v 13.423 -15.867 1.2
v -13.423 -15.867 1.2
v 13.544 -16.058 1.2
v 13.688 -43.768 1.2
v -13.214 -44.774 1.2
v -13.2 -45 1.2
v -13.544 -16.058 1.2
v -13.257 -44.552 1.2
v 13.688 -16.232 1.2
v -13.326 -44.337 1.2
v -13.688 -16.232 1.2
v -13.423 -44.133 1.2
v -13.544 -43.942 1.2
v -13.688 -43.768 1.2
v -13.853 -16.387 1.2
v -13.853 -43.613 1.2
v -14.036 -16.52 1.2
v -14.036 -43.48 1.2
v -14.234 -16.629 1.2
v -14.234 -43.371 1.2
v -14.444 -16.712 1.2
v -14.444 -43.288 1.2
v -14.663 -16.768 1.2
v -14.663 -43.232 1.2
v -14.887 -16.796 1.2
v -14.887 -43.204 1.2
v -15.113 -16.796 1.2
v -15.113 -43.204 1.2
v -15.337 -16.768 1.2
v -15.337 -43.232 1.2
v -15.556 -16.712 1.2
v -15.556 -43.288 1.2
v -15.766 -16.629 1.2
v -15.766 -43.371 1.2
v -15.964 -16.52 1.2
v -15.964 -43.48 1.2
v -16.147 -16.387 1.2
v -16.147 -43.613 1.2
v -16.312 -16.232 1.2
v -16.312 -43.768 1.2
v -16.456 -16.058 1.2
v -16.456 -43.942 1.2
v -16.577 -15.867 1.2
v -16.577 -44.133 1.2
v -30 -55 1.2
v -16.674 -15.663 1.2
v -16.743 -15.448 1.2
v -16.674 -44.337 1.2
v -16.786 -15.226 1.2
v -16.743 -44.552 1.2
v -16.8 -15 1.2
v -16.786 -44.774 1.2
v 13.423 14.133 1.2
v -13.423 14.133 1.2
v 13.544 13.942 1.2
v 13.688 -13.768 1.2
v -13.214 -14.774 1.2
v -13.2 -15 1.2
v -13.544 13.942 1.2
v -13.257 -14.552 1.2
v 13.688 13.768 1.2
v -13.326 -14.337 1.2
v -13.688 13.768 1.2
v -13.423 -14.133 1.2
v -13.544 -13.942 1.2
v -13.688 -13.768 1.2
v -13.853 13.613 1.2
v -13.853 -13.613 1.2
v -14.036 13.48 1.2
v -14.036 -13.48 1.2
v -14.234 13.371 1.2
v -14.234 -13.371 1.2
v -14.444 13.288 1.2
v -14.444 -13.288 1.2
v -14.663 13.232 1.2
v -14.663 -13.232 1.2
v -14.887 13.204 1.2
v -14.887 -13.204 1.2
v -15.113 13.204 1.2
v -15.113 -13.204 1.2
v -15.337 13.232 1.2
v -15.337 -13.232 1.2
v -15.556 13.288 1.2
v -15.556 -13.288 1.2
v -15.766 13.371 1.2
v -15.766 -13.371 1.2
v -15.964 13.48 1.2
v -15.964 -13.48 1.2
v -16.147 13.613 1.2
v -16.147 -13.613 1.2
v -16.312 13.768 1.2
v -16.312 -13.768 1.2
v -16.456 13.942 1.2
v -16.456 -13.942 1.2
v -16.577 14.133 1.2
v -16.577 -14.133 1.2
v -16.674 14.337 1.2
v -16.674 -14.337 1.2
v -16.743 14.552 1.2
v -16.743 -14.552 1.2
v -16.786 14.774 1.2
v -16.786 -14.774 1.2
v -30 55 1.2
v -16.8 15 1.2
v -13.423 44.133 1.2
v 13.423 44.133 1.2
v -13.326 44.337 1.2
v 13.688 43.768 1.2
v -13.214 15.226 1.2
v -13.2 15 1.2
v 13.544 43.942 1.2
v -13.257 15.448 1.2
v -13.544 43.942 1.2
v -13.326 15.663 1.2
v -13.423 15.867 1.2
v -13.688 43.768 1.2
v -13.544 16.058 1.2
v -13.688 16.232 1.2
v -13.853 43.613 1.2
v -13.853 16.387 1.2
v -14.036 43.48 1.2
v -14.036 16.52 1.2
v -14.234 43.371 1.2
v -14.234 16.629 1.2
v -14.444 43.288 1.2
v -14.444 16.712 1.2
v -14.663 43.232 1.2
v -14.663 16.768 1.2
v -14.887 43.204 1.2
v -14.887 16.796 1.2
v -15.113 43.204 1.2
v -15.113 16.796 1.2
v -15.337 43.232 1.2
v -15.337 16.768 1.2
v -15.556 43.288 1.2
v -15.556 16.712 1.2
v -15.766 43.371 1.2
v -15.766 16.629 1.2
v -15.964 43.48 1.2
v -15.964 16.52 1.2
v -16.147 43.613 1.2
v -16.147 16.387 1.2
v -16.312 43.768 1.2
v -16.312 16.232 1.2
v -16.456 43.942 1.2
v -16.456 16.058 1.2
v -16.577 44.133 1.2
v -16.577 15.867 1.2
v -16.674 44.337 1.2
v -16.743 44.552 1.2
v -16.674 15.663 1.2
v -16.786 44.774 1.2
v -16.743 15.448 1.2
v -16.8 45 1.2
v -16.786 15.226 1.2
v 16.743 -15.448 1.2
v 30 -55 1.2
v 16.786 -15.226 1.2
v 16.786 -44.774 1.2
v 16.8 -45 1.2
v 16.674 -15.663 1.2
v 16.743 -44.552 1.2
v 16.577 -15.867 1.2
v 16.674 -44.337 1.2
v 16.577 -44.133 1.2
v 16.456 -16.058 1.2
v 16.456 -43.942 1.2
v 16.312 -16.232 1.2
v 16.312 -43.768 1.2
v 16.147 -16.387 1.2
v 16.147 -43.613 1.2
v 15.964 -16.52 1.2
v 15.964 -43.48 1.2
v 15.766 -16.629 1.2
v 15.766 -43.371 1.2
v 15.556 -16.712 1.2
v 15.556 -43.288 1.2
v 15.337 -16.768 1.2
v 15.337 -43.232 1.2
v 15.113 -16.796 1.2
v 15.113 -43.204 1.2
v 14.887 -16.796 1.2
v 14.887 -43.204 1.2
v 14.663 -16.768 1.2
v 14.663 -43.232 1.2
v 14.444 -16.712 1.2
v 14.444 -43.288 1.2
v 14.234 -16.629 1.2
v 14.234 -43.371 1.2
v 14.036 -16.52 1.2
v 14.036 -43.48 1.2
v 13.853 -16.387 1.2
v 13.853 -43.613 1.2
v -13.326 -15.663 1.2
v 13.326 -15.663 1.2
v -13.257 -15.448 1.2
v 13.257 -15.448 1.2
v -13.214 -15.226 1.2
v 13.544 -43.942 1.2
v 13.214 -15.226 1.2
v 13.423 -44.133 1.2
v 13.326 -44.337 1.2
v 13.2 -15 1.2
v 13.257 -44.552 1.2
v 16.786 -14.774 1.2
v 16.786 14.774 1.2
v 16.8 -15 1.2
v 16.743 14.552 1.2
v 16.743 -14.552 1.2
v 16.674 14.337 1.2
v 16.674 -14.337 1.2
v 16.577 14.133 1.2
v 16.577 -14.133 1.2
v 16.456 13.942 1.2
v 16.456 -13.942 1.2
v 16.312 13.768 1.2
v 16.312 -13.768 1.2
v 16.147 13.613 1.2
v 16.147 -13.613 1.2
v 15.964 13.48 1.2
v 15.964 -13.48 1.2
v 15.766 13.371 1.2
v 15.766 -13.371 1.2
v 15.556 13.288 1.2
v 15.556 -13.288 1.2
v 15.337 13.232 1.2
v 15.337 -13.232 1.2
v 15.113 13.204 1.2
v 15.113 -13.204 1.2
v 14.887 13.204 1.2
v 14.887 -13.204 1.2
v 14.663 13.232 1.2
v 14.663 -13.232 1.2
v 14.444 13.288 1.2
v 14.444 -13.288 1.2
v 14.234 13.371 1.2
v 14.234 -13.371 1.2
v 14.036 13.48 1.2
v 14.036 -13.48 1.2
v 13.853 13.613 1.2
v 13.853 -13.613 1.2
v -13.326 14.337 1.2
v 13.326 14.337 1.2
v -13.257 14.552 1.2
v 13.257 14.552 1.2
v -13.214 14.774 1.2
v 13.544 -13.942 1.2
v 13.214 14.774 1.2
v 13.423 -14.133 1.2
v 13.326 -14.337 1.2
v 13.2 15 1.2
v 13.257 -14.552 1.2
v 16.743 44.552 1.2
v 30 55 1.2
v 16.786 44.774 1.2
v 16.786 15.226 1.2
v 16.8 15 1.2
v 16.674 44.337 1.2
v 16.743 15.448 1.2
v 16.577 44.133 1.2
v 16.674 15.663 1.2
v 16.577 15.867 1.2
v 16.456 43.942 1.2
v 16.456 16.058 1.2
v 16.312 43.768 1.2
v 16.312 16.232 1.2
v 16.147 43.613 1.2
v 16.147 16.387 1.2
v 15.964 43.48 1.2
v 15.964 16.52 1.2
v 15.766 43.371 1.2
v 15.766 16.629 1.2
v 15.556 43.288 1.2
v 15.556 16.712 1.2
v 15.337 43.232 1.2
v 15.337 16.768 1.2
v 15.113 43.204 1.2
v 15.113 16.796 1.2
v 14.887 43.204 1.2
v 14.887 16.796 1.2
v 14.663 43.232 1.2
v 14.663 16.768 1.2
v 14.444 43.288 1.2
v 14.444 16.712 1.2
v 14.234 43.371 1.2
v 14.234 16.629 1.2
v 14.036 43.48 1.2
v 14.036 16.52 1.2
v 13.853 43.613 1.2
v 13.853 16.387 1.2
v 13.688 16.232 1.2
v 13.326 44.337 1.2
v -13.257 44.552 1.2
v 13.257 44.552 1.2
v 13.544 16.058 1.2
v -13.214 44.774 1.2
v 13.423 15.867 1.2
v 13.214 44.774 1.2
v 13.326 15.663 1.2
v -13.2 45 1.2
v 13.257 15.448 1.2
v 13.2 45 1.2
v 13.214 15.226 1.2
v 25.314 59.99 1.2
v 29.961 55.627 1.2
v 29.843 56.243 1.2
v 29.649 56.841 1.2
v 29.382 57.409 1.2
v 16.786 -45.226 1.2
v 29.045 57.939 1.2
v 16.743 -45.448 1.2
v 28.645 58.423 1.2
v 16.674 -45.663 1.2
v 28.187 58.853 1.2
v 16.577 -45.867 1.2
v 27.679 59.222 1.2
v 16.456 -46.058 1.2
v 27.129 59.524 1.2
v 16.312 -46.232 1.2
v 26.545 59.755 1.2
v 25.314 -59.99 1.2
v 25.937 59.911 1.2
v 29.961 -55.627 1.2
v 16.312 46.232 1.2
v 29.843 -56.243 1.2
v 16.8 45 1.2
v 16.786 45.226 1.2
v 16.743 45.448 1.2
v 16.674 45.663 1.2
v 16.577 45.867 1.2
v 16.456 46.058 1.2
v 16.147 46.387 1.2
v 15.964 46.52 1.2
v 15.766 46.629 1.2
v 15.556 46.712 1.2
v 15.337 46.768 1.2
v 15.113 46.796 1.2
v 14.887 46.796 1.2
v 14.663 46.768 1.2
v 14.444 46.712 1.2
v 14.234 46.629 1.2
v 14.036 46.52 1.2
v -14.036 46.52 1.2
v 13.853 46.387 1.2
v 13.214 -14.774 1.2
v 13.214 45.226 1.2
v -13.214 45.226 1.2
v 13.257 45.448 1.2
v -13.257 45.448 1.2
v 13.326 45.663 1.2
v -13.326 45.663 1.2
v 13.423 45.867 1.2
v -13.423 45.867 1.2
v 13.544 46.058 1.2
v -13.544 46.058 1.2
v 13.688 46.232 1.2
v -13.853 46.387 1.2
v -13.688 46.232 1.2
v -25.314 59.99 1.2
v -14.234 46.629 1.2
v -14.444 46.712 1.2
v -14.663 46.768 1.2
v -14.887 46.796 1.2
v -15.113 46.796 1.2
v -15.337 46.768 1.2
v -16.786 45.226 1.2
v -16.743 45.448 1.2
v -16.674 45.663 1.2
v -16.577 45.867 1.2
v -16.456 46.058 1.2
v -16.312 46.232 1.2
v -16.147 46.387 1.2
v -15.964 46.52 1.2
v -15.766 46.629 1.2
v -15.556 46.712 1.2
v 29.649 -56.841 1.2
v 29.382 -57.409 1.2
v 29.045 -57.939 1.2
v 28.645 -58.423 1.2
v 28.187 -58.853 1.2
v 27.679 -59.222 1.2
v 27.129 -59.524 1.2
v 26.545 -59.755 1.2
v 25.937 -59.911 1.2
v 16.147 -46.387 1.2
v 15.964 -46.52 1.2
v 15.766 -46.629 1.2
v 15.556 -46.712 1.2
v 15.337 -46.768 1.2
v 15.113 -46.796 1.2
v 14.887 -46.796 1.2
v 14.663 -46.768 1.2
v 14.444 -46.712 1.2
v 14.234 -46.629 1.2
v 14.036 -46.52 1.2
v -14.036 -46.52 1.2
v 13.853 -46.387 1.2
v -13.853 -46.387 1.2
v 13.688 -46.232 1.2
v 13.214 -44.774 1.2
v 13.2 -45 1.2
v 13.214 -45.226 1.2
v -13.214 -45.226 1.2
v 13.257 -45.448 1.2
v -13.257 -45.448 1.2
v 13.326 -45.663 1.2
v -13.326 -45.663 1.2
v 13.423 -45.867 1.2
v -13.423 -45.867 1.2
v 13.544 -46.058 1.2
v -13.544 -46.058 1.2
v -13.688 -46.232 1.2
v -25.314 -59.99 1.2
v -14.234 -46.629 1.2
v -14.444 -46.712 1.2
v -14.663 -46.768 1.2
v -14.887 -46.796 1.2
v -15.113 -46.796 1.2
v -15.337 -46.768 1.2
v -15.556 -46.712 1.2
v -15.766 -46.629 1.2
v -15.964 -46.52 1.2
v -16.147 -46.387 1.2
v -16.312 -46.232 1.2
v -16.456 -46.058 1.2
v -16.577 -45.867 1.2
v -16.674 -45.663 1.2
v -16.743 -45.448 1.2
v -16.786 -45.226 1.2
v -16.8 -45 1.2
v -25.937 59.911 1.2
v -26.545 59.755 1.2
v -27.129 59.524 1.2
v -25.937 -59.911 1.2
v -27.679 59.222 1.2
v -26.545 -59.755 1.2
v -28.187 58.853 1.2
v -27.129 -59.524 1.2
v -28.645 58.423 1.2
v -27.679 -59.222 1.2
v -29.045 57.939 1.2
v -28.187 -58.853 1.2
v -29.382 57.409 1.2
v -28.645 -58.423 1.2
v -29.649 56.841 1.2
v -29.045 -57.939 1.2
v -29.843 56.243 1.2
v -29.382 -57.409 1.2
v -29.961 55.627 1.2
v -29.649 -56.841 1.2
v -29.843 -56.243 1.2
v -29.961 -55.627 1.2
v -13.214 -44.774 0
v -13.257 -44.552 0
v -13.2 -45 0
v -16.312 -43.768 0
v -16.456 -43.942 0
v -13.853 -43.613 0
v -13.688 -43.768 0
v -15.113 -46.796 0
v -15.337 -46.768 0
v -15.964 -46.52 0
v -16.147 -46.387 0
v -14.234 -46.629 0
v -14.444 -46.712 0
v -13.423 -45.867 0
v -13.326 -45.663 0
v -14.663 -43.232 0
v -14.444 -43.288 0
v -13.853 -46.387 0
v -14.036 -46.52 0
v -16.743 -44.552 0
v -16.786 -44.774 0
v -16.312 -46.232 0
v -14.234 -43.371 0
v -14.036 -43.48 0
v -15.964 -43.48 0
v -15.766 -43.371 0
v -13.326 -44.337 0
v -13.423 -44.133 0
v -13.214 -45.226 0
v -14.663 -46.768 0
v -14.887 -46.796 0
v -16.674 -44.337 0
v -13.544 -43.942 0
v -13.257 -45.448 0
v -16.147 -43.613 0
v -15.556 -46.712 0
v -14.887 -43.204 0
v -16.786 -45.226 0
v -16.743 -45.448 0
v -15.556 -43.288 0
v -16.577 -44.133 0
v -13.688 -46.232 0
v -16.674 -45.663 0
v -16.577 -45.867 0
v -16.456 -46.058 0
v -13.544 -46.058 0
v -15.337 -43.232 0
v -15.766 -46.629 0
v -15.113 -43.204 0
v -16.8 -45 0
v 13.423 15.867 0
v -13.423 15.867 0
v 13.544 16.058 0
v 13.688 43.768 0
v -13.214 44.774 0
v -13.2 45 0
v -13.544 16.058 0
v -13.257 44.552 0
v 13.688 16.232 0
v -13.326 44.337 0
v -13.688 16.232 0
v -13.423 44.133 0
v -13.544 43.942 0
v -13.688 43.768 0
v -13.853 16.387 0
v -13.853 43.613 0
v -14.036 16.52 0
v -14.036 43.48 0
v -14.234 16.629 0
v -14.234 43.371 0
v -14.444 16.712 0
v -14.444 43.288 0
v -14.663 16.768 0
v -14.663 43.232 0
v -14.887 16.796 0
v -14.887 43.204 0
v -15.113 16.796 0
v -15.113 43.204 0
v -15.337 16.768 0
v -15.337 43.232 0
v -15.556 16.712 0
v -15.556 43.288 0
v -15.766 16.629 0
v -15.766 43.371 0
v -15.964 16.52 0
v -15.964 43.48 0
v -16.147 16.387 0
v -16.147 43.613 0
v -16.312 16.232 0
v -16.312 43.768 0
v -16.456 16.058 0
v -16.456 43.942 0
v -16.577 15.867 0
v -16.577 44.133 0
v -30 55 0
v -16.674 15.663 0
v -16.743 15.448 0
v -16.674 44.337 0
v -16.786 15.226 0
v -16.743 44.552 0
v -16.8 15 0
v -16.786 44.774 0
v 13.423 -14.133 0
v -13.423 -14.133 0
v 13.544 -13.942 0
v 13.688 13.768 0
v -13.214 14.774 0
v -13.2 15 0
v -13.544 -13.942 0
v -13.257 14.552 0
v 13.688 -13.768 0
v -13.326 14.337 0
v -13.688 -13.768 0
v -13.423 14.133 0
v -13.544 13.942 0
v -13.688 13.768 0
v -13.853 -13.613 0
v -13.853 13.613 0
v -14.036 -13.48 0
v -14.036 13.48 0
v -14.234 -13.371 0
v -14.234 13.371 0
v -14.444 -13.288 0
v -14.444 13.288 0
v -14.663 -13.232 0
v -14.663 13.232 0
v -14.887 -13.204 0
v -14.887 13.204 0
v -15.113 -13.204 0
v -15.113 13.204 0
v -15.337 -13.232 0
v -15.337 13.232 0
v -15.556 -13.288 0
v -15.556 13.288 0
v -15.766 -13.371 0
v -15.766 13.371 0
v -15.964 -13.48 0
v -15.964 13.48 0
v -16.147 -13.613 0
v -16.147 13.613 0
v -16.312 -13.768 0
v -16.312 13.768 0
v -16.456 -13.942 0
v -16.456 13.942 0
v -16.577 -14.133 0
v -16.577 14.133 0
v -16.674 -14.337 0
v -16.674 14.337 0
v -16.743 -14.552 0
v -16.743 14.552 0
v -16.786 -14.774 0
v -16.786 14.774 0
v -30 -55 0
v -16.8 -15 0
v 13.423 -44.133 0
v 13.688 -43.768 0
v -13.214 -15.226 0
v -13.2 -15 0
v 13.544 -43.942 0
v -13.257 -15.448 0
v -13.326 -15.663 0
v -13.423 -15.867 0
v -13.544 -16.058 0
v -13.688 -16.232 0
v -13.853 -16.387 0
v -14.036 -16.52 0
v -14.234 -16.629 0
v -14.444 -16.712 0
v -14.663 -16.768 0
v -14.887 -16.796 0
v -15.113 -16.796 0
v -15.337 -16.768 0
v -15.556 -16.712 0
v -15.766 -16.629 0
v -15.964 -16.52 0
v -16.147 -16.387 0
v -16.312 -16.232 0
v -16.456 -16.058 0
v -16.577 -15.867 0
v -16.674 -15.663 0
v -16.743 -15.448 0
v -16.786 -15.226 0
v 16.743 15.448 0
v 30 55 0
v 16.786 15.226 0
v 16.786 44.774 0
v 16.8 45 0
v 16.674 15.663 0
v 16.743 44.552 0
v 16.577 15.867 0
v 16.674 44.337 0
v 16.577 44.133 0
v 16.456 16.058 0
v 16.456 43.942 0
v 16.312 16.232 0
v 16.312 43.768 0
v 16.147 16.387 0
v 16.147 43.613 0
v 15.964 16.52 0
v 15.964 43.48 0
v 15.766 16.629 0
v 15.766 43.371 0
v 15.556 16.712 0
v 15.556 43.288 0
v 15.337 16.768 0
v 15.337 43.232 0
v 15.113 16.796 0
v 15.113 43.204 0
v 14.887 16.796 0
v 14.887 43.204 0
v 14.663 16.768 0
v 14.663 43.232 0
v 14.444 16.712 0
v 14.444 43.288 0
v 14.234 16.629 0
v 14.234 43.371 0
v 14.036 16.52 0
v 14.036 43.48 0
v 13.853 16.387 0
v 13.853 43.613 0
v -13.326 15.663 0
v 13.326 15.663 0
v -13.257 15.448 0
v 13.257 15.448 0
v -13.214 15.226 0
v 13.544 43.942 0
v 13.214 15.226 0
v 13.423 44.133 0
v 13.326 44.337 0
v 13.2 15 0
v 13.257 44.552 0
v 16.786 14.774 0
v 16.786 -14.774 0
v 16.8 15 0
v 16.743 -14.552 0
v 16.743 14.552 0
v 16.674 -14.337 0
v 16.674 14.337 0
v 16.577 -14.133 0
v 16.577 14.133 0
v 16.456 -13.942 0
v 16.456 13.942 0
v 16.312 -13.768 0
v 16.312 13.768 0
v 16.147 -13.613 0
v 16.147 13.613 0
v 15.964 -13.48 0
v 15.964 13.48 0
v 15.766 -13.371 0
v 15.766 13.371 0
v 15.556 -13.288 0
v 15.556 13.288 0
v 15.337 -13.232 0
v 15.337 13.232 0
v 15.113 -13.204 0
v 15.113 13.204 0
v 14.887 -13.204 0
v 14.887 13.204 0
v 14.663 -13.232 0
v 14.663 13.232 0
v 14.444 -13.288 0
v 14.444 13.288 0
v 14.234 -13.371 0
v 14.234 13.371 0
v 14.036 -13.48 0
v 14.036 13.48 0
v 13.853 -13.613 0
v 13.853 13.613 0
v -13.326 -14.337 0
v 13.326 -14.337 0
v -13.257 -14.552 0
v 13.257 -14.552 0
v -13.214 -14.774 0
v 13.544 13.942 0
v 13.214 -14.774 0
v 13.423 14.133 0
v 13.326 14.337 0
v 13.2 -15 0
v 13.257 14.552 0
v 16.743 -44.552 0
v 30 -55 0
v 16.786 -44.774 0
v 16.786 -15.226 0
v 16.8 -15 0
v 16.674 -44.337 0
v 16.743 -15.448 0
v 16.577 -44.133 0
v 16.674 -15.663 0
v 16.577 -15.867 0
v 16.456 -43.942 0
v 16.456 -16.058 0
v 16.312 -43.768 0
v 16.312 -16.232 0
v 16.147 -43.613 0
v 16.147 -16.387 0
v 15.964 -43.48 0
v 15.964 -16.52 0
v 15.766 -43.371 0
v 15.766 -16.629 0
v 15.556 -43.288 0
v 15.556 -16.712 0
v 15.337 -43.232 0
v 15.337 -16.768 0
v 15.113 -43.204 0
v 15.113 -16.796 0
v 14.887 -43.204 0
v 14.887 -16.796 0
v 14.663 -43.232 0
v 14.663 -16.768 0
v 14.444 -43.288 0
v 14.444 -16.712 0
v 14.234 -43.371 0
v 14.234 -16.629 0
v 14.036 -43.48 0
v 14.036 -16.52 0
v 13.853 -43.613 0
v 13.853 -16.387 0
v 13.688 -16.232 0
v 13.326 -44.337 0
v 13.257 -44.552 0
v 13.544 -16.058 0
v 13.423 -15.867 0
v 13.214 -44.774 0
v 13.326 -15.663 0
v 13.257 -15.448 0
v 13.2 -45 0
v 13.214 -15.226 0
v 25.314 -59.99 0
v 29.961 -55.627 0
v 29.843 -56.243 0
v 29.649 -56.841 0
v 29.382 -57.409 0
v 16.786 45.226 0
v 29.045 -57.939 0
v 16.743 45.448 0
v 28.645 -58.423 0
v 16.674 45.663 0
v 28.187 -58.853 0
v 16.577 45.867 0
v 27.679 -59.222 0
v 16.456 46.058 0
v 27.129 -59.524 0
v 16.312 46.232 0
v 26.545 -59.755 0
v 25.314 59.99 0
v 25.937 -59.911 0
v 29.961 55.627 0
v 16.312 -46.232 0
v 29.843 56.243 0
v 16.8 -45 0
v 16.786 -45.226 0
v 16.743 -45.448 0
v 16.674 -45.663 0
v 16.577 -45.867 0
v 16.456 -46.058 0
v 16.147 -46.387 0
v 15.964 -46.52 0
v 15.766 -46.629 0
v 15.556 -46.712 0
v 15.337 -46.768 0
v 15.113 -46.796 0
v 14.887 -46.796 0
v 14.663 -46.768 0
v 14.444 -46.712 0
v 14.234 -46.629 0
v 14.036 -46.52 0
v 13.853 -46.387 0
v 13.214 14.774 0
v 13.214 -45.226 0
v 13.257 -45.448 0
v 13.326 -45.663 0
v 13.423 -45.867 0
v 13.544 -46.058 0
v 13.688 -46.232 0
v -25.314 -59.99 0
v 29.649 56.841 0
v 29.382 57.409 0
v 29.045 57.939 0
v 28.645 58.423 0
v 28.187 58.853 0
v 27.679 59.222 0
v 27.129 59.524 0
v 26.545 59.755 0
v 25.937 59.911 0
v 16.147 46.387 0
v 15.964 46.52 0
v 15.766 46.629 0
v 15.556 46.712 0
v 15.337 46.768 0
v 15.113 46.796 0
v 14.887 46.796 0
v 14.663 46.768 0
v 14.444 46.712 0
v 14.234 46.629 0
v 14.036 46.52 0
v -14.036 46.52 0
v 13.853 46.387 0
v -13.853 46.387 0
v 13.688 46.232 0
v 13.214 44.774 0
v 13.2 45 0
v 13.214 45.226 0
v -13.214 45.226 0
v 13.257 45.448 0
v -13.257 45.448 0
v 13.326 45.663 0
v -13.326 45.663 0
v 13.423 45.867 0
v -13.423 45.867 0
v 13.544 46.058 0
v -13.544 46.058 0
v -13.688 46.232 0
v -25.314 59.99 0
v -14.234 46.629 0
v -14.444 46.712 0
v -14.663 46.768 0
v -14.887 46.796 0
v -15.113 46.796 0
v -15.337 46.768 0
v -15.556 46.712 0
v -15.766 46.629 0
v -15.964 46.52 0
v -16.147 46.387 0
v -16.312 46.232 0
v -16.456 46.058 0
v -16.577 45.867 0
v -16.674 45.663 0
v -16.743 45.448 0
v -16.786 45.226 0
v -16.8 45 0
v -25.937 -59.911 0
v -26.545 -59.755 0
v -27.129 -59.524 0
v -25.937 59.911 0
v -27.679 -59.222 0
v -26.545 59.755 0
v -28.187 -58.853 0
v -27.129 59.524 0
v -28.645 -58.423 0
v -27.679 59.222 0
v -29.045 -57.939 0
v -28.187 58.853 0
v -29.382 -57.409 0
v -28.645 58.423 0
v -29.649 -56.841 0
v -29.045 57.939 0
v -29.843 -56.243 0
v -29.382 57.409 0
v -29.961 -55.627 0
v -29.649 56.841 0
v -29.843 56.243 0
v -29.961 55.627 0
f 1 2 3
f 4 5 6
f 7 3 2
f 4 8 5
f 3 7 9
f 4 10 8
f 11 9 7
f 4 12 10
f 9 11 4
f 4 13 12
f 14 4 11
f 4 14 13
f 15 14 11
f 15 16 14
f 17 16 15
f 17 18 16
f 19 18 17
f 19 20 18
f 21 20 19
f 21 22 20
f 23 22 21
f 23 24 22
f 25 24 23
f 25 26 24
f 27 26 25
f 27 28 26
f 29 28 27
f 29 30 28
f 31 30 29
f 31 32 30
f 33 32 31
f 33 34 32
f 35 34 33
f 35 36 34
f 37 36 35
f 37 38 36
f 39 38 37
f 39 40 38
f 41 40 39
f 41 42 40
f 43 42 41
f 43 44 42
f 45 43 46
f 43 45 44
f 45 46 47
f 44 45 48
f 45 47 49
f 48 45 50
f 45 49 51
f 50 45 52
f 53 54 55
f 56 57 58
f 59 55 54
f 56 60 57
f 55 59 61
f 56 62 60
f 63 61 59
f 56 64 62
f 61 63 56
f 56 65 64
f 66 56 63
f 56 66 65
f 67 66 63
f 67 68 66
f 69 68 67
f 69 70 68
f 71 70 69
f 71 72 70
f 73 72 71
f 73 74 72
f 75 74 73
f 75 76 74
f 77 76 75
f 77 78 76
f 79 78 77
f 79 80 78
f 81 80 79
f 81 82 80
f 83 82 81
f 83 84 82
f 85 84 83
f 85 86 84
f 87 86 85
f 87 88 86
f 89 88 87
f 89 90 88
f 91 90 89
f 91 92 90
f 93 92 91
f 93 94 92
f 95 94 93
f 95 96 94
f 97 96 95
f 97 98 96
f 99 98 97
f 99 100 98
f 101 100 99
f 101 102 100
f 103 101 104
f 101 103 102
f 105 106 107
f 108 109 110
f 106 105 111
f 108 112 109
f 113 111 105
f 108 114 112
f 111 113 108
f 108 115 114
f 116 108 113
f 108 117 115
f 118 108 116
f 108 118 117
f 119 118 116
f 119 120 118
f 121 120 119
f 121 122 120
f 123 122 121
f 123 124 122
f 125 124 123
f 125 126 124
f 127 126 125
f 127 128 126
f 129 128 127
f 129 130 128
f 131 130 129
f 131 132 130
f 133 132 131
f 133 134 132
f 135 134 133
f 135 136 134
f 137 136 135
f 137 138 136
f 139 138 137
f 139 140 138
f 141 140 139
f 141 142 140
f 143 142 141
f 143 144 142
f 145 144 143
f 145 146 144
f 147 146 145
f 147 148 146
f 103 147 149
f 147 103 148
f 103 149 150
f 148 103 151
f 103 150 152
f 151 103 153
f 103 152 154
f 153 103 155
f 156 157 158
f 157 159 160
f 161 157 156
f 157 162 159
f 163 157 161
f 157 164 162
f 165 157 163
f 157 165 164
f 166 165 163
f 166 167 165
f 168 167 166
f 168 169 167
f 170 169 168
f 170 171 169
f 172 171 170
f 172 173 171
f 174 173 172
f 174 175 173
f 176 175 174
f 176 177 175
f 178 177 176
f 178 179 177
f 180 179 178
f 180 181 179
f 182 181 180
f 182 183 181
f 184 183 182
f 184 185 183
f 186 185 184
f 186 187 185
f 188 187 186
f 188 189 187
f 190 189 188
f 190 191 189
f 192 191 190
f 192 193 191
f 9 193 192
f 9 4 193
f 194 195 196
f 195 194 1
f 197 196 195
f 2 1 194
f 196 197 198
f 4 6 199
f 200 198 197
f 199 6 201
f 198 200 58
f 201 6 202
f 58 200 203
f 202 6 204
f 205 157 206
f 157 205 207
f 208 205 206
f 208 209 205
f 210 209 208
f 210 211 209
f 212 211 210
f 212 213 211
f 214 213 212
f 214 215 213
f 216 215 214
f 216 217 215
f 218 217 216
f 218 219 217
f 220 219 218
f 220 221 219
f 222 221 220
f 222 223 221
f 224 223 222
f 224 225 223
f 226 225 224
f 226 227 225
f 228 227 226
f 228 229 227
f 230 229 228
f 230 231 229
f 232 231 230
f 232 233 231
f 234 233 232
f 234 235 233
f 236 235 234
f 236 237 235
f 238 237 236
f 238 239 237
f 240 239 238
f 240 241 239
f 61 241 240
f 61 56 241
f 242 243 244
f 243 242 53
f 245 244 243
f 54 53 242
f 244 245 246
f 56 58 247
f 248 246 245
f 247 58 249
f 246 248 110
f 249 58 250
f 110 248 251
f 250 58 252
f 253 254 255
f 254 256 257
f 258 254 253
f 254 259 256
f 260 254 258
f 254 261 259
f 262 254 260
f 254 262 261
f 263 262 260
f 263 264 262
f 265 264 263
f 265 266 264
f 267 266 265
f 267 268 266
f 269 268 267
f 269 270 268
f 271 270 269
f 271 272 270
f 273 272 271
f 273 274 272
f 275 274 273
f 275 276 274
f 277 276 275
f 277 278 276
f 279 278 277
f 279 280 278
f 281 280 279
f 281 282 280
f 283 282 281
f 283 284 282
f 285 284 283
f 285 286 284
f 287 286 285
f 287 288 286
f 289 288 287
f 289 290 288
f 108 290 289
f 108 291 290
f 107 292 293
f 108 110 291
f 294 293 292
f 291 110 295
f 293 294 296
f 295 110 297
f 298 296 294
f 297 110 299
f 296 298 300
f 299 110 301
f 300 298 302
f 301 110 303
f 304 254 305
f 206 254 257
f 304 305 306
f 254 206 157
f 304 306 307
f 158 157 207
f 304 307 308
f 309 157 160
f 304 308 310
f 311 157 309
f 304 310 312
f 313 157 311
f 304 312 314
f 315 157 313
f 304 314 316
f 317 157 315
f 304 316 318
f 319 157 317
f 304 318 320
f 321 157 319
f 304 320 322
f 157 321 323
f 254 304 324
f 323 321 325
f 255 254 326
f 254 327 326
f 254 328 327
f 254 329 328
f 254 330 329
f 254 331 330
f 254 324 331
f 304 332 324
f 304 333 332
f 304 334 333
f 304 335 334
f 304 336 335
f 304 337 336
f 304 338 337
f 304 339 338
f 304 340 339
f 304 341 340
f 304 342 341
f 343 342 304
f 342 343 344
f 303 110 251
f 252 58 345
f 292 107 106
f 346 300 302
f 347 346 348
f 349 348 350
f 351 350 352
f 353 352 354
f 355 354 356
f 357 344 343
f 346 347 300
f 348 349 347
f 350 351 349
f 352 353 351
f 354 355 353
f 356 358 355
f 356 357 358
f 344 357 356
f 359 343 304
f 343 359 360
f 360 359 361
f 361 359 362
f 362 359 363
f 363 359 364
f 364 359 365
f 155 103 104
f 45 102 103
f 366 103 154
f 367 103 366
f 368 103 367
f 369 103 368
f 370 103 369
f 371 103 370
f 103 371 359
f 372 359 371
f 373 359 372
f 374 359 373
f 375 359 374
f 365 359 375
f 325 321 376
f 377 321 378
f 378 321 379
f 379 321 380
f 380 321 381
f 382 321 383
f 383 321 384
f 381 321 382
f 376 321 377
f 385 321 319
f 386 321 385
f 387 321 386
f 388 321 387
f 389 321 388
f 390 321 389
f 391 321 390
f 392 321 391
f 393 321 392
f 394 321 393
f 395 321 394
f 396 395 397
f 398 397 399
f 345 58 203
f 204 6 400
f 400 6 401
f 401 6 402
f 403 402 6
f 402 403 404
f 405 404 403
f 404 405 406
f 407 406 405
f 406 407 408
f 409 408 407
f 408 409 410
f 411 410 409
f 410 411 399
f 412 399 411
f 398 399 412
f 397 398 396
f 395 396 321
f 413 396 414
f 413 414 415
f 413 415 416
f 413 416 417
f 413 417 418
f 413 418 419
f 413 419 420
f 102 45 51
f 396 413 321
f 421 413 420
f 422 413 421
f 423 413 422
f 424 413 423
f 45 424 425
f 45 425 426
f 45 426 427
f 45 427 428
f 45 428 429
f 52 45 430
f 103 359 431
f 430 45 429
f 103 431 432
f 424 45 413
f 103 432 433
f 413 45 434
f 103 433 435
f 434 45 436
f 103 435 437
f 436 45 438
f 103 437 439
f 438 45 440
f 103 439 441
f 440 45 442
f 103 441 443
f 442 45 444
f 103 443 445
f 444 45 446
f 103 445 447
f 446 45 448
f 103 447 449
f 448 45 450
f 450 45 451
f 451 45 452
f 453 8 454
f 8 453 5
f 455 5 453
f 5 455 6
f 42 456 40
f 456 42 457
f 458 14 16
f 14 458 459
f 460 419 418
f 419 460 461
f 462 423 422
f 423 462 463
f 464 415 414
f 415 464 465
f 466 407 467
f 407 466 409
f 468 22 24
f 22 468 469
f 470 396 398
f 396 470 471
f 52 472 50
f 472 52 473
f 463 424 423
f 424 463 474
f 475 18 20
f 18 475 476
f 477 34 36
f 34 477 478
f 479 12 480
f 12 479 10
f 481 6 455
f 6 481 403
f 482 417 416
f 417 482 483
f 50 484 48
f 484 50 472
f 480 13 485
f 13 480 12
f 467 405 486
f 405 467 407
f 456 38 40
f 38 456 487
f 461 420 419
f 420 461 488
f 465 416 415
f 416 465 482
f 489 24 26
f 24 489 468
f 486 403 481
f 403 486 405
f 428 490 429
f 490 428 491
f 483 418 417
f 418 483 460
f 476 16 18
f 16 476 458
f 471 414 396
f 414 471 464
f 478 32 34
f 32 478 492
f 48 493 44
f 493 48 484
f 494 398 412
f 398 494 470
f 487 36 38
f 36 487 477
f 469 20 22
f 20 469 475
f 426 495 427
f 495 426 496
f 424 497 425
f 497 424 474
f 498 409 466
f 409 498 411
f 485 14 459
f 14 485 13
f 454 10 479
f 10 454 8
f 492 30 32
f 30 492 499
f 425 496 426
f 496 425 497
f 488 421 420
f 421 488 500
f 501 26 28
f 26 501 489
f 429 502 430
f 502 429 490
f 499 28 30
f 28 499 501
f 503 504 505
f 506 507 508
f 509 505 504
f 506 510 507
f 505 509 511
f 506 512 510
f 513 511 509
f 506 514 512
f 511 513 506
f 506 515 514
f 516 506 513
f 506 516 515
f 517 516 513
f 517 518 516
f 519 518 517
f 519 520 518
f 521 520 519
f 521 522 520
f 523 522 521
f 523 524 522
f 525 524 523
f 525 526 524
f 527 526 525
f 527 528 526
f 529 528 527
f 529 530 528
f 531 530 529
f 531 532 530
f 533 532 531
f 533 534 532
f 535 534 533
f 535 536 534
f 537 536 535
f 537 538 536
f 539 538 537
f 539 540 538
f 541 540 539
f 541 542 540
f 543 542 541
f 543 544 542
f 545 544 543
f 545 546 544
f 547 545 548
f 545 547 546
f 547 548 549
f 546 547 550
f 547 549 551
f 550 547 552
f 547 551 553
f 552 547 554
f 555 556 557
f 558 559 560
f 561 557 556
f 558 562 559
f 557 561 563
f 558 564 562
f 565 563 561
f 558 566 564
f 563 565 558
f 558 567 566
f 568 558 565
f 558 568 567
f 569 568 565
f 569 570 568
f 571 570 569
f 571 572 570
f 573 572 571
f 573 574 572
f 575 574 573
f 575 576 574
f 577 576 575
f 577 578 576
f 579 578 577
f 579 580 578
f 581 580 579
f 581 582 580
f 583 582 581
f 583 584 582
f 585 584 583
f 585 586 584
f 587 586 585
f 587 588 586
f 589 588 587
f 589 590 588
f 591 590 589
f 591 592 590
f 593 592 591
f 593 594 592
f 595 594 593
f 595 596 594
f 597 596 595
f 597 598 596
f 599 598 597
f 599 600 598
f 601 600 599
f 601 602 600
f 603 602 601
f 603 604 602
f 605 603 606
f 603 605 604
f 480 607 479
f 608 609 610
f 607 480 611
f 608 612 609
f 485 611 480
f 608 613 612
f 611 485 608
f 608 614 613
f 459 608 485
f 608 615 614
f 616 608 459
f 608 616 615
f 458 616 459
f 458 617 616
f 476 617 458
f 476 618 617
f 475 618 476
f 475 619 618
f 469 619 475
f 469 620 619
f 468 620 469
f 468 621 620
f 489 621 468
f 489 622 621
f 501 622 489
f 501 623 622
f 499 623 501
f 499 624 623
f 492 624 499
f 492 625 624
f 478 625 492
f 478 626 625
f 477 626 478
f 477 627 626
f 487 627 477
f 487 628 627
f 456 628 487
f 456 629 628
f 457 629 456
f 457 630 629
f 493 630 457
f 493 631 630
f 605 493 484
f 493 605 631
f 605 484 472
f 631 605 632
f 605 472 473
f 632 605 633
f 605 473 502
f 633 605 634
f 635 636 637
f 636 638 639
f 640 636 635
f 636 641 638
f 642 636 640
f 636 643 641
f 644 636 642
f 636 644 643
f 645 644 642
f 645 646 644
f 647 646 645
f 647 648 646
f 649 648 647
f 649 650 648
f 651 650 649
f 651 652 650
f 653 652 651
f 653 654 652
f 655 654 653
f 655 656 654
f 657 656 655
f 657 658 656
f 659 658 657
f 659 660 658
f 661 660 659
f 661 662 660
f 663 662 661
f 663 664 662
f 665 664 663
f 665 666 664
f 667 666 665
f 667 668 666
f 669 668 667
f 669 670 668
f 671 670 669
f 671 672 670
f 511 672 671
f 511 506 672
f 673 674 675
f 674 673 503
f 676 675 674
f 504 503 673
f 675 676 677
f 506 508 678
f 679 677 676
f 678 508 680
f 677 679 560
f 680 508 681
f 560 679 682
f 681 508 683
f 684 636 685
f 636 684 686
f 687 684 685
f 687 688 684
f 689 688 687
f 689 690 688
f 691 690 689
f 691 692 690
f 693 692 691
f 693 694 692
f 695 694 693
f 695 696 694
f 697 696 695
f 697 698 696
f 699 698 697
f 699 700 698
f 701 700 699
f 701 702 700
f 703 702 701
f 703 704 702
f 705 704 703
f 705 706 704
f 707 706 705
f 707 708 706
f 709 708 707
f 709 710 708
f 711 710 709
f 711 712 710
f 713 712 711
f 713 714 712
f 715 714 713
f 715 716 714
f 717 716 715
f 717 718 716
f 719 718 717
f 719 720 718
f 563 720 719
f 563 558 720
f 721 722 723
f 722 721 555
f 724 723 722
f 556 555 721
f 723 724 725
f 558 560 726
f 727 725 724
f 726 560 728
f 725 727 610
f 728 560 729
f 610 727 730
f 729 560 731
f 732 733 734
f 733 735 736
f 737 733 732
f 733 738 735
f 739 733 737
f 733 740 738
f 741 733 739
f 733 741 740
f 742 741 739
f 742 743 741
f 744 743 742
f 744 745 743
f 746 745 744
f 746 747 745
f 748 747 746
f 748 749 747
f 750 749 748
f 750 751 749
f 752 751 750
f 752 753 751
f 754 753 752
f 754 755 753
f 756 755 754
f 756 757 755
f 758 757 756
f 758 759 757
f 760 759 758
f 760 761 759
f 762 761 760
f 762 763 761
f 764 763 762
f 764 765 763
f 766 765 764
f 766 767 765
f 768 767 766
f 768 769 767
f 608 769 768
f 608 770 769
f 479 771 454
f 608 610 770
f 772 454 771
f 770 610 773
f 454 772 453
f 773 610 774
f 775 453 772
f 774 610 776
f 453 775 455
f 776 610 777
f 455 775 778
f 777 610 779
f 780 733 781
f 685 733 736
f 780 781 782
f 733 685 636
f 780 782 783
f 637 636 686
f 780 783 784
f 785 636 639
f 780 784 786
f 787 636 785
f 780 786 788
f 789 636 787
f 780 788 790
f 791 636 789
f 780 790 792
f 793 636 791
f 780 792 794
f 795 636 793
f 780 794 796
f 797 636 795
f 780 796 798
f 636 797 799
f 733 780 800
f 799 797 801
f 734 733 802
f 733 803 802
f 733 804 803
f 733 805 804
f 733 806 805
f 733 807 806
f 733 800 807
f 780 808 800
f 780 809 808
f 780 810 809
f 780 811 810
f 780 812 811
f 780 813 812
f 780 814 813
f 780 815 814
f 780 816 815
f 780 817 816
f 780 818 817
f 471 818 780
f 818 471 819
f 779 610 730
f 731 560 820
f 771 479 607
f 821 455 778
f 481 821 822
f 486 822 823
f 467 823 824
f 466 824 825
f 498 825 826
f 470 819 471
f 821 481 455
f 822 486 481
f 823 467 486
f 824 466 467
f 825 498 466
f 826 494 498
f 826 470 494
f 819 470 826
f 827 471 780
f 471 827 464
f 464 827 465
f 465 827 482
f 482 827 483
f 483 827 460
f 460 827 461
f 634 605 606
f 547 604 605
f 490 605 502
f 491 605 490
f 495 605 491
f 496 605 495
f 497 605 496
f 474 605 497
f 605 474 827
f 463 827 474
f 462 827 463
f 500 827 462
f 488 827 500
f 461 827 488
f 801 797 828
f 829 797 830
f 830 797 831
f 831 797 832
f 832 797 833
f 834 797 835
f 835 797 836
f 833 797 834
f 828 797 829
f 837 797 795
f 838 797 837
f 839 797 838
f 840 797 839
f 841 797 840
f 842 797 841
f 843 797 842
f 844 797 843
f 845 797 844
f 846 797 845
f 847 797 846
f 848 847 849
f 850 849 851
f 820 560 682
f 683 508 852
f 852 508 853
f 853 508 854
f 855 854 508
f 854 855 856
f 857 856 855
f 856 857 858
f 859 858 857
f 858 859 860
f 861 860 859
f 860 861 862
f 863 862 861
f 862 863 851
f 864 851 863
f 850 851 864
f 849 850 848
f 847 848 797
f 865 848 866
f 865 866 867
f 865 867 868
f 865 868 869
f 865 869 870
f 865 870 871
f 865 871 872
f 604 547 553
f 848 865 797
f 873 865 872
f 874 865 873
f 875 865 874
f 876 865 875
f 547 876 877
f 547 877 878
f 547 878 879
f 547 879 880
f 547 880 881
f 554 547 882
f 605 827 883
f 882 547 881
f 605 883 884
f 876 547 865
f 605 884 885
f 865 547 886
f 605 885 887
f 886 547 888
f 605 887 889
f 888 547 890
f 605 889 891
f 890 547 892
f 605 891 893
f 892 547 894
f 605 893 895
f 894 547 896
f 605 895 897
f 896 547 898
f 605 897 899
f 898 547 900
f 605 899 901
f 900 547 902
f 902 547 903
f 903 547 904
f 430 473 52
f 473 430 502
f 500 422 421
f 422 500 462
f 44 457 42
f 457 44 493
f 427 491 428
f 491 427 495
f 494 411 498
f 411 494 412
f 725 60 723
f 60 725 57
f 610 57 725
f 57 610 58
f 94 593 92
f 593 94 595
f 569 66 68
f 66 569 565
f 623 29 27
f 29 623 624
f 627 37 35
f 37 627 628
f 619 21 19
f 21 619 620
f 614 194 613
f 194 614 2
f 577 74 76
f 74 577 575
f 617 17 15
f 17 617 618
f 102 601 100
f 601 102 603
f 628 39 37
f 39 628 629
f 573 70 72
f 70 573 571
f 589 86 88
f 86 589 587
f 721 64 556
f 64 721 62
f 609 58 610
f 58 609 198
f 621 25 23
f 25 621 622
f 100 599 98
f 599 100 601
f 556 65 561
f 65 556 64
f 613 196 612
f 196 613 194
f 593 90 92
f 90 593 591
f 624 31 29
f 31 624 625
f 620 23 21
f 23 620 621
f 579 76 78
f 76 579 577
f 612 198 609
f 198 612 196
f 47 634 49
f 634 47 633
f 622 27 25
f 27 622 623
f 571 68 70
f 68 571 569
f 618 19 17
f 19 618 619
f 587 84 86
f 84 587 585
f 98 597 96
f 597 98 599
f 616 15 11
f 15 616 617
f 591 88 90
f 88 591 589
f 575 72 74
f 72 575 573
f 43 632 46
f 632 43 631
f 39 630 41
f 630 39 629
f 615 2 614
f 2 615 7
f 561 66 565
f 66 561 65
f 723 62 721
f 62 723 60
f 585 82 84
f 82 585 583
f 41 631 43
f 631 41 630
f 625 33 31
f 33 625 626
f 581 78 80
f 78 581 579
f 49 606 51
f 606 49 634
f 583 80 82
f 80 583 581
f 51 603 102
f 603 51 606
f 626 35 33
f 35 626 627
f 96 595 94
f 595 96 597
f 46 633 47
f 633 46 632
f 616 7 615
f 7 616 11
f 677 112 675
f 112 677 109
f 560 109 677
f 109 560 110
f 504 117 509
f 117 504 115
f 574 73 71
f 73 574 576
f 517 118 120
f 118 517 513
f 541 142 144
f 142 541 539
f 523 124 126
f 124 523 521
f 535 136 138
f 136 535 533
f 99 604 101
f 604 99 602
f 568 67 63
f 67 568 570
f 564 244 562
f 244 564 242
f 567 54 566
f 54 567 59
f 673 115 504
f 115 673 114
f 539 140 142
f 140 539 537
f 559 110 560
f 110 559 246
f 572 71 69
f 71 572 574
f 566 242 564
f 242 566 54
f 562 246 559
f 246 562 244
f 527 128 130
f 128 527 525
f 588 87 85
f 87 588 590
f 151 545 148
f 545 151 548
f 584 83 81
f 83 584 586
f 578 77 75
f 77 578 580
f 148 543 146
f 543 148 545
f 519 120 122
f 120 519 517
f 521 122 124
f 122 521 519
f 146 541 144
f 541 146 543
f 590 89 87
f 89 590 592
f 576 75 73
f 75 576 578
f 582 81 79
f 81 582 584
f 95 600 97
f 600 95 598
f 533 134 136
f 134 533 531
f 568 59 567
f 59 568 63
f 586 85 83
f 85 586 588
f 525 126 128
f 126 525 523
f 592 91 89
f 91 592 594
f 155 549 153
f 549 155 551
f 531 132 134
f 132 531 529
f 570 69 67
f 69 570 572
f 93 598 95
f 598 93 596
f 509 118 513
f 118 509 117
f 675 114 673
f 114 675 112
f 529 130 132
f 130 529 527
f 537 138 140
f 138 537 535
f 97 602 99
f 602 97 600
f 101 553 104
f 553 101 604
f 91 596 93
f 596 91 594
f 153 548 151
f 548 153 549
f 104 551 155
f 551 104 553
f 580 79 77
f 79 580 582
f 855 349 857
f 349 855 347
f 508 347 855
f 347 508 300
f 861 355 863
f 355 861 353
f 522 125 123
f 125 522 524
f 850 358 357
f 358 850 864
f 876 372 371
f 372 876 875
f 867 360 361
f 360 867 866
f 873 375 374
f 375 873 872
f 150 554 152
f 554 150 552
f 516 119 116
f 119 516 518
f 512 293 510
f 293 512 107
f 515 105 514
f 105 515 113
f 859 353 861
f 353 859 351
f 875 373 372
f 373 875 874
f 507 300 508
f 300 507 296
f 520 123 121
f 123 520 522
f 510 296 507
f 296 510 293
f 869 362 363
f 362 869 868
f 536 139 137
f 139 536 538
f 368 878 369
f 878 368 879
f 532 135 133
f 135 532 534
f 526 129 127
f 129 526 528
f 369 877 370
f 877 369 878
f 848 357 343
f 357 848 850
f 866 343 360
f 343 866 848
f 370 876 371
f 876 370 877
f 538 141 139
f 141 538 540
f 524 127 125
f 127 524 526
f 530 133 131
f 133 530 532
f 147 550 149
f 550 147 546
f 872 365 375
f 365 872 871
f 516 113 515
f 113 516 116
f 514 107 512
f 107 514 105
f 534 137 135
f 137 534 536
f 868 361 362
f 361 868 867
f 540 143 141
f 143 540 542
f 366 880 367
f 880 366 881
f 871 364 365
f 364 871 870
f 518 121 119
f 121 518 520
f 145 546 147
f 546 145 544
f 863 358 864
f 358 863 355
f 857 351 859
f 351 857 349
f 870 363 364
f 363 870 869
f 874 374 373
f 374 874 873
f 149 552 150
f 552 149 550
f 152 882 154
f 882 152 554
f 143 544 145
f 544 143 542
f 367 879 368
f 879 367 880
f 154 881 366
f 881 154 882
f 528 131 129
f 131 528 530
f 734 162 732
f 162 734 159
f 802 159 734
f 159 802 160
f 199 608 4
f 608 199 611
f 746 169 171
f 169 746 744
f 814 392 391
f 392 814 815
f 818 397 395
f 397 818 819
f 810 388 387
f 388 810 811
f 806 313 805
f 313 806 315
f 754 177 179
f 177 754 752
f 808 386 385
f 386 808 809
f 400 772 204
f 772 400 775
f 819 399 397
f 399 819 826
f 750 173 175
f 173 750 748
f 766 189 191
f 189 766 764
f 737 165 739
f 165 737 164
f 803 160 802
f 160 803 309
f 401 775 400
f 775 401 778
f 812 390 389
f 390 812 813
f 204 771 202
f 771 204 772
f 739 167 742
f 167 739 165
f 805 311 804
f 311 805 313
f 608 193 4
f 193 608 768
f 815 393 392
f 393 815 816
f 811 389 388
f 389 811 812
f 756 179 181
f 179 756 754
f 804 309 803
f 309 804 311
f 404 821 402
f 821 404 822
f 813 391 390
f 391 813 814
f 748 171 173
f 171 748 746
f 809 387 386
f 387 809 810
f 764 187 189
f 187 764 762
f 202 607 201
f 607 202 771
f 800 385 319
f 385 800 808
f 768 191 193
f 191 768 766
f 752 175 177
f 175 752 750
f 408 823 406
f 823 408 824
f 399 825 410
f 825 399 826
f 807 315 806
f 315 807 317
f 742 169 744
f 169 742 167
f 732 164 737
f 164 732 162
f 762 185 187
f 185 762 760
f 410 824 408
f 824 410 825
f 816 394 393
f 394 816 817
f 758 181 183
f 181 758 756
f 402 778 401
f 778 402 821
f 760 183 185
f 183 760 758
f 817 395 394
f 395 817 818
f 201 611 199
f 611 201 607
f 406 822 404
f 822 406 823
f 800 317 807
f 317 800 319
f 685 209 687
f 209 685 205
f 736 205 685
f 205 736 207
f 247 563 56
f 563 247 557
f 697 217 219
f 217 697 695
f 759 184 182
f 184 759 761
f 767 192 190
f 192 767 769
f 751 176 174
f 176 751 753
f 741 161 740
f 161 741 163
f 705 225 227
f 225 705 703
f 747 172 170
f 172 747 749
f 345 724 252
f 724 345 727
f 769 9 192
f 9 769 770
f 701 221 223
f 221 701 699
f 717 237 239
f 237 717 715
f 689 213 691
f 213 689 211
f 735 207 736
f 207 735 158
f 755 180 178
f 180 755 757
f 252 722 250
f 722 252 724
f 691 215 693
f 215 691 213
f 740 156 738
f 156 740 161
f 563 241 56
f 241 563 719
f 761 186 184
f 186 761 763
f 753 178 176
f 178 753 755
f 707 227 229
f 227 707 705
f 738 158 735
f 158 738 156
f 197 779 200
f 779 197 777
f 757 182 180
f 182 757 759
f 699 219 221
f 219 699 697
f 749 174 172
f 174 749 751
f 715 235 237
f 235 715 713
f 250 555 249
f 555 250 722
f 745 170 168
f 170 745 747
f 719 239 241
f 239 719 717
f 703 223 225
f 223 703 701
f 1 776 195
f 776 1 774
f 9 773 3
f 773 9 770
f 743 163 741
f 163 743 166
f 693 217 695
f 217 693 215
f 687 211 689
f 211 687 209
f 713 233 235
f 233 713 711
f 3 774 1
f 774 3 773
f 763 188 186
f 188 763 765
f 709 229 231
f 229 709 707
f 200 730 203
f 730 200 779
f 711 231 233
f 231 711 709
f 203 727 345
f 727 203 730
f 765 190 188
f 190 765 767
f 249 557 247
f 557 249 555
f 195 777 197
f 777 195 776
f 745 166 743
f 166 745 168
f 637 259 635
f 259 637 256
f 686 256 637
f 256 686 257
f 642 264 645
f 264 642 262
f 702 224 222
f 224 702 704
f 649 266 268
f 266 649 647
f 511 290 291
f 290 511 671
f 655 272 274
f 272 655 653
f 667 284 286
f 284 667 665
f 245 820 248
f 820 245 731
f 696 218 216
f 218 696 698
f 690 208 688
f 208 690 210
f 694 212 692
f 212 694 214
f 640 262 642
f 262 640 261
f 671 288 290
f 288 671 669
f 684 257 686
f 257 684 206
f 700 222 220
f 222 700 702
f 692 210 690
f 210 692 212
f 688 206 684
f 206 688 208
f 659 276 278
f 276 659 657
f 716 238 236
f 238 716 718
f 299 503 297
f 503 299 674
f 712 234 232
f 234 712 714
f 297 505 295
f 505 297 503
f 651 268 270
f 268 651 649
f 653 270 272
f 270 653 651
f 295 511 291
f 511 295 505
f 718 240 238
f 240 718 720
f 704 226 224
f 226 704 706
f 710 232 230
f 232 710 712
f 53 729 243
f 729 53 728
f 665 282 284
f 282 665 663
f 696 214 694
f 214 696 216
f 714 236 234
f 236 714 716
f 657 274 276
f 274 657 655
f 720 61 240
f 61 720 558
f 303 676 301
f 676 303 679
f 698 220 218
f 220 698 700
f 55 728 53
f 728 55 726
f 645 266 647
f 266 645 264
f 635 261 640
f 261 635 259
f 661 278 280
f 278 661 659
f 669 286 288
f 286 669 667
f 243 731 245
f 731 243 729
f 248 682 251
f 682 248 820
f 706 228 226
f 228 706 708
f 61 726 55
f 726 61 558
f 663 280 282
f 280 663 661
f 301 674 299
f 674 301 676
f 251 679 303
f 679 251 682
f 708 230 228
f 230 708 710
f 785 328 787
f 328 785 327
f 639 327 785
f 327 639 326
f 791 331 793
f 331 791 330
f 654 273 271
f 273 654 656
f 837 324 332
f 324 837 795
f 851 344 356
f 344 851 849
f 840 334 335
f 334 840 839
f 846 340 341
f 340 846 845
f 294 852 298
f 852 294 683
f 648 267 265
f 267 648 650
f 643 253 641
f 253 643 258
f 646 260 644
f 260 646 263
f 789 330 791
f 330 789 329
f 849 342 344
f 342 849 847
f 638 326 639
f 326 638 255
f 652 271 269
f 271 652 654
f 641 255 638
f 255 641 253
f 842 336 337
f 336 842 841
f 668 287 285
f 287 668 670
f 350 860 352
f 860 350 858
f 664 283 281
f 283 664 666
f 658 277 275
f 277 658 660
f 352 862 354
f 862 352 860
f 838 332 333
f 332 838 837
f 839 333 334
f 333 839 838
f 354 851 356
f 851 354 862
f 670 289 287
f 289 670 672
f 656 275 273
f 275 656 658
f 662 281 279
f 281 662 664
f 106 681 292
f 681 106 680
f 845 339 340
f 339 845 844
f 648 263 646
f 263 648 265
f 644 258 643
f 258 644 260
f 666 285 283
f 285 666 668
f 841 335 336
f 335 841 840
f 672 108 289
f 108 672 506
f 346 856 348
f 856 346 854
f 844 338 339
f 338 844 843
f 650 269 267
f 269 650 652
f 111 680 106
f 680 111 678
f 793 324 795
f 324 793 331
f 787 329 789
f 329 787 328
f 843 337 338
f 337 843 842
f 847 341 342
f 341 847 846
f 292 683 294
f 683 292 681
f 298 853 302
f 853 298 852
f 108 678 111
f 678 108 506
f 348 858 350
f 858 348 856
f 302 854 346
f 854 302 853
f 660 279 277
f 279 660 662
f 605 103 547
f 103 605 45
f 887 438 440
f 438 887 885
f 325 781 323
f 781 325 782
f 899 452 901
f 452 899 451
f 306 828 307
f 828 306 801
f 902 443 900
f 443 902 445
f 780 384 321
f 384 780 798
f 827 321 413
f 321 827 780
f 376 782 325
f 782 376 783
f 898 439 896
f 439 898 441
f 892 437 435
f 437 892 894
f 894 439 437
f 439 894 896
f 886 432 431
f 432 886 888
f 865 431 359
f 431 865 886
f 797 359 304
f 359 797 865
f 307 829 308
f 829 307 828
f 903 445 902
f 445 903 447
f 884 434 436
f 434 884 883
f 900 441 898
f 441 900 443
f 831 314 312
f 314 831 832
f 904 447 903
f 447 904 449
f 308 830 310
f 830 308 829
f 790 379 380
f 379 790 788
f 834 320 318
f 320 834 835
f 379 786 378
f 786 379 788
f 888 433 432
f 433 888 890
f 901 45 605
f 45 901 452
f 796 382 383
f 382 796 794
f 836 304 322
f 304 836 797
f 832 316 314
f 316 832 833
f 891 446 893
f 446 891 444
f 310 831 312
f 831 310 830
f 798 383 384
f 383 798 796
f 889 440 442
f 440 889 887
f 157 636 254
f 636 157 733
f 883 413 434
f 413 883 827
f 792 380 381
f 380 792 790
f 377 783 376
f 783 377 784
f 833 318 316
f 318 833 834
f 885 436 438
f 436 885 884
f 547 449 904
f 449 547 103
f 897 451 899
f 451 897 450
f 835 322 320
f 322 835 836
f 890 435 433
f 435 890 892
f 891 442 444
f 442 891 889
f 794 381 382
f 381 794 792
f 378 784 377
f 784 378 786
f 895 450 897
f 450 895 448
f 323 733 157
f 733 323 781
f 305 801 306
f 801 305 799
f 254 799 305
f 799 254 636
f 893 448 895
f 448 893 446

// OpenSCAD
$fn = 50;


difference() {
	union() {
		hull() {
			translate(v = [-25.0000000000, 55.0000000000, 0]) {
				cylinder(h = 30, r = 5);
			}
			translate(v = [25.0000000000, 55.0000000000, 0]) {
				cylinder(h = 30, r = 5);
			}
			translate(v = [-25.0000000000, -55.0000000000, 0]) {
				cylinder(h = 30, r = 5);
			}
			translate(v = [25.0000000000, -55.0000000000, 0]) {
				cylinder(h = 30, r = 5);
			}
		}
	}
	union() {
		translate(v = [0, 0, 1.2000000000]) {
			hull() {
				translate(v = [-25.0000000000, 55.0000000000, 0]) {
					cylinder(h = 28.8000000000, r = 3.8000000000);
				}
				translate(v = [25.0000000000, 55.0000000000, 0]) {
					cylinder(h = 28.8000000000, r = 3.8000000000);
				}
				translate(v = [-25.0000000000, -55.0000000000, 0]) {
					cylinder(h = 28.8000000000, r = 3.8000000000);
				}
				translate(v = [25.0000000000, -55.0000000000, 0]) {
					cylinder(h = 28.8000000000, r = 3.8000000000);
				}
			}
		}
		#translate(v = [-15.0000000000, -45.0000000000, 0]) {
			cylinder(h = 1.2000000000, r = 1.8000000000);
		}
		#translate(v = [-15.0000000000, -15.0000000000, 0]) {
			cylinder(h = 1.2000000000, r = 1.8000000000);
		}
		#translate(v = [-15.0000000000, 15.0000000000, 0]) {
			cylinder(h = 1.2000000000, r = 1.8000000000);
		}
		#translate(v = [-15.0000000000, 45.0000000000, 0]) {
			cylinder(h = 1.2000000000, r = 1.8000000000);
		}
		#translate(v = [15.0000000000, -45.0000000000, 0]) {
			cylinder(h = 1.2000000000, r = 1.8000000000);
		}
		#translate(v = [15.0000000000, -15.0000000000, 0]) {
			cylinder(h = 1.2000000000, r = 1.8000000000);
		}
		#translate(v = [15.0000000000, 15.0000000000, 0]) {
			cylinder(h = 1.2000000000, r = 1.8000000000);
		}
		#translate(v = [15.0000000000, 45.0000000000, 0]) {
			cylinder(h = 1.2000000000, r = 1.8000000000);
		}
		translate(v = [-250.0000000000, -250.0000000000, 1.2000000000]) {
			cube(size = [500, 500, 500]);
		}
		translate(v = [-250.0000000000, -250.0000000000, 1.2000000000]) {
			cube(size = [500, 500, 500]);
		}
		translate(v = [-250.0000000000, -250.0000000000, 1.2000000000]) {
			cube(size = [500, 500, 500]);
		}
	}
}
